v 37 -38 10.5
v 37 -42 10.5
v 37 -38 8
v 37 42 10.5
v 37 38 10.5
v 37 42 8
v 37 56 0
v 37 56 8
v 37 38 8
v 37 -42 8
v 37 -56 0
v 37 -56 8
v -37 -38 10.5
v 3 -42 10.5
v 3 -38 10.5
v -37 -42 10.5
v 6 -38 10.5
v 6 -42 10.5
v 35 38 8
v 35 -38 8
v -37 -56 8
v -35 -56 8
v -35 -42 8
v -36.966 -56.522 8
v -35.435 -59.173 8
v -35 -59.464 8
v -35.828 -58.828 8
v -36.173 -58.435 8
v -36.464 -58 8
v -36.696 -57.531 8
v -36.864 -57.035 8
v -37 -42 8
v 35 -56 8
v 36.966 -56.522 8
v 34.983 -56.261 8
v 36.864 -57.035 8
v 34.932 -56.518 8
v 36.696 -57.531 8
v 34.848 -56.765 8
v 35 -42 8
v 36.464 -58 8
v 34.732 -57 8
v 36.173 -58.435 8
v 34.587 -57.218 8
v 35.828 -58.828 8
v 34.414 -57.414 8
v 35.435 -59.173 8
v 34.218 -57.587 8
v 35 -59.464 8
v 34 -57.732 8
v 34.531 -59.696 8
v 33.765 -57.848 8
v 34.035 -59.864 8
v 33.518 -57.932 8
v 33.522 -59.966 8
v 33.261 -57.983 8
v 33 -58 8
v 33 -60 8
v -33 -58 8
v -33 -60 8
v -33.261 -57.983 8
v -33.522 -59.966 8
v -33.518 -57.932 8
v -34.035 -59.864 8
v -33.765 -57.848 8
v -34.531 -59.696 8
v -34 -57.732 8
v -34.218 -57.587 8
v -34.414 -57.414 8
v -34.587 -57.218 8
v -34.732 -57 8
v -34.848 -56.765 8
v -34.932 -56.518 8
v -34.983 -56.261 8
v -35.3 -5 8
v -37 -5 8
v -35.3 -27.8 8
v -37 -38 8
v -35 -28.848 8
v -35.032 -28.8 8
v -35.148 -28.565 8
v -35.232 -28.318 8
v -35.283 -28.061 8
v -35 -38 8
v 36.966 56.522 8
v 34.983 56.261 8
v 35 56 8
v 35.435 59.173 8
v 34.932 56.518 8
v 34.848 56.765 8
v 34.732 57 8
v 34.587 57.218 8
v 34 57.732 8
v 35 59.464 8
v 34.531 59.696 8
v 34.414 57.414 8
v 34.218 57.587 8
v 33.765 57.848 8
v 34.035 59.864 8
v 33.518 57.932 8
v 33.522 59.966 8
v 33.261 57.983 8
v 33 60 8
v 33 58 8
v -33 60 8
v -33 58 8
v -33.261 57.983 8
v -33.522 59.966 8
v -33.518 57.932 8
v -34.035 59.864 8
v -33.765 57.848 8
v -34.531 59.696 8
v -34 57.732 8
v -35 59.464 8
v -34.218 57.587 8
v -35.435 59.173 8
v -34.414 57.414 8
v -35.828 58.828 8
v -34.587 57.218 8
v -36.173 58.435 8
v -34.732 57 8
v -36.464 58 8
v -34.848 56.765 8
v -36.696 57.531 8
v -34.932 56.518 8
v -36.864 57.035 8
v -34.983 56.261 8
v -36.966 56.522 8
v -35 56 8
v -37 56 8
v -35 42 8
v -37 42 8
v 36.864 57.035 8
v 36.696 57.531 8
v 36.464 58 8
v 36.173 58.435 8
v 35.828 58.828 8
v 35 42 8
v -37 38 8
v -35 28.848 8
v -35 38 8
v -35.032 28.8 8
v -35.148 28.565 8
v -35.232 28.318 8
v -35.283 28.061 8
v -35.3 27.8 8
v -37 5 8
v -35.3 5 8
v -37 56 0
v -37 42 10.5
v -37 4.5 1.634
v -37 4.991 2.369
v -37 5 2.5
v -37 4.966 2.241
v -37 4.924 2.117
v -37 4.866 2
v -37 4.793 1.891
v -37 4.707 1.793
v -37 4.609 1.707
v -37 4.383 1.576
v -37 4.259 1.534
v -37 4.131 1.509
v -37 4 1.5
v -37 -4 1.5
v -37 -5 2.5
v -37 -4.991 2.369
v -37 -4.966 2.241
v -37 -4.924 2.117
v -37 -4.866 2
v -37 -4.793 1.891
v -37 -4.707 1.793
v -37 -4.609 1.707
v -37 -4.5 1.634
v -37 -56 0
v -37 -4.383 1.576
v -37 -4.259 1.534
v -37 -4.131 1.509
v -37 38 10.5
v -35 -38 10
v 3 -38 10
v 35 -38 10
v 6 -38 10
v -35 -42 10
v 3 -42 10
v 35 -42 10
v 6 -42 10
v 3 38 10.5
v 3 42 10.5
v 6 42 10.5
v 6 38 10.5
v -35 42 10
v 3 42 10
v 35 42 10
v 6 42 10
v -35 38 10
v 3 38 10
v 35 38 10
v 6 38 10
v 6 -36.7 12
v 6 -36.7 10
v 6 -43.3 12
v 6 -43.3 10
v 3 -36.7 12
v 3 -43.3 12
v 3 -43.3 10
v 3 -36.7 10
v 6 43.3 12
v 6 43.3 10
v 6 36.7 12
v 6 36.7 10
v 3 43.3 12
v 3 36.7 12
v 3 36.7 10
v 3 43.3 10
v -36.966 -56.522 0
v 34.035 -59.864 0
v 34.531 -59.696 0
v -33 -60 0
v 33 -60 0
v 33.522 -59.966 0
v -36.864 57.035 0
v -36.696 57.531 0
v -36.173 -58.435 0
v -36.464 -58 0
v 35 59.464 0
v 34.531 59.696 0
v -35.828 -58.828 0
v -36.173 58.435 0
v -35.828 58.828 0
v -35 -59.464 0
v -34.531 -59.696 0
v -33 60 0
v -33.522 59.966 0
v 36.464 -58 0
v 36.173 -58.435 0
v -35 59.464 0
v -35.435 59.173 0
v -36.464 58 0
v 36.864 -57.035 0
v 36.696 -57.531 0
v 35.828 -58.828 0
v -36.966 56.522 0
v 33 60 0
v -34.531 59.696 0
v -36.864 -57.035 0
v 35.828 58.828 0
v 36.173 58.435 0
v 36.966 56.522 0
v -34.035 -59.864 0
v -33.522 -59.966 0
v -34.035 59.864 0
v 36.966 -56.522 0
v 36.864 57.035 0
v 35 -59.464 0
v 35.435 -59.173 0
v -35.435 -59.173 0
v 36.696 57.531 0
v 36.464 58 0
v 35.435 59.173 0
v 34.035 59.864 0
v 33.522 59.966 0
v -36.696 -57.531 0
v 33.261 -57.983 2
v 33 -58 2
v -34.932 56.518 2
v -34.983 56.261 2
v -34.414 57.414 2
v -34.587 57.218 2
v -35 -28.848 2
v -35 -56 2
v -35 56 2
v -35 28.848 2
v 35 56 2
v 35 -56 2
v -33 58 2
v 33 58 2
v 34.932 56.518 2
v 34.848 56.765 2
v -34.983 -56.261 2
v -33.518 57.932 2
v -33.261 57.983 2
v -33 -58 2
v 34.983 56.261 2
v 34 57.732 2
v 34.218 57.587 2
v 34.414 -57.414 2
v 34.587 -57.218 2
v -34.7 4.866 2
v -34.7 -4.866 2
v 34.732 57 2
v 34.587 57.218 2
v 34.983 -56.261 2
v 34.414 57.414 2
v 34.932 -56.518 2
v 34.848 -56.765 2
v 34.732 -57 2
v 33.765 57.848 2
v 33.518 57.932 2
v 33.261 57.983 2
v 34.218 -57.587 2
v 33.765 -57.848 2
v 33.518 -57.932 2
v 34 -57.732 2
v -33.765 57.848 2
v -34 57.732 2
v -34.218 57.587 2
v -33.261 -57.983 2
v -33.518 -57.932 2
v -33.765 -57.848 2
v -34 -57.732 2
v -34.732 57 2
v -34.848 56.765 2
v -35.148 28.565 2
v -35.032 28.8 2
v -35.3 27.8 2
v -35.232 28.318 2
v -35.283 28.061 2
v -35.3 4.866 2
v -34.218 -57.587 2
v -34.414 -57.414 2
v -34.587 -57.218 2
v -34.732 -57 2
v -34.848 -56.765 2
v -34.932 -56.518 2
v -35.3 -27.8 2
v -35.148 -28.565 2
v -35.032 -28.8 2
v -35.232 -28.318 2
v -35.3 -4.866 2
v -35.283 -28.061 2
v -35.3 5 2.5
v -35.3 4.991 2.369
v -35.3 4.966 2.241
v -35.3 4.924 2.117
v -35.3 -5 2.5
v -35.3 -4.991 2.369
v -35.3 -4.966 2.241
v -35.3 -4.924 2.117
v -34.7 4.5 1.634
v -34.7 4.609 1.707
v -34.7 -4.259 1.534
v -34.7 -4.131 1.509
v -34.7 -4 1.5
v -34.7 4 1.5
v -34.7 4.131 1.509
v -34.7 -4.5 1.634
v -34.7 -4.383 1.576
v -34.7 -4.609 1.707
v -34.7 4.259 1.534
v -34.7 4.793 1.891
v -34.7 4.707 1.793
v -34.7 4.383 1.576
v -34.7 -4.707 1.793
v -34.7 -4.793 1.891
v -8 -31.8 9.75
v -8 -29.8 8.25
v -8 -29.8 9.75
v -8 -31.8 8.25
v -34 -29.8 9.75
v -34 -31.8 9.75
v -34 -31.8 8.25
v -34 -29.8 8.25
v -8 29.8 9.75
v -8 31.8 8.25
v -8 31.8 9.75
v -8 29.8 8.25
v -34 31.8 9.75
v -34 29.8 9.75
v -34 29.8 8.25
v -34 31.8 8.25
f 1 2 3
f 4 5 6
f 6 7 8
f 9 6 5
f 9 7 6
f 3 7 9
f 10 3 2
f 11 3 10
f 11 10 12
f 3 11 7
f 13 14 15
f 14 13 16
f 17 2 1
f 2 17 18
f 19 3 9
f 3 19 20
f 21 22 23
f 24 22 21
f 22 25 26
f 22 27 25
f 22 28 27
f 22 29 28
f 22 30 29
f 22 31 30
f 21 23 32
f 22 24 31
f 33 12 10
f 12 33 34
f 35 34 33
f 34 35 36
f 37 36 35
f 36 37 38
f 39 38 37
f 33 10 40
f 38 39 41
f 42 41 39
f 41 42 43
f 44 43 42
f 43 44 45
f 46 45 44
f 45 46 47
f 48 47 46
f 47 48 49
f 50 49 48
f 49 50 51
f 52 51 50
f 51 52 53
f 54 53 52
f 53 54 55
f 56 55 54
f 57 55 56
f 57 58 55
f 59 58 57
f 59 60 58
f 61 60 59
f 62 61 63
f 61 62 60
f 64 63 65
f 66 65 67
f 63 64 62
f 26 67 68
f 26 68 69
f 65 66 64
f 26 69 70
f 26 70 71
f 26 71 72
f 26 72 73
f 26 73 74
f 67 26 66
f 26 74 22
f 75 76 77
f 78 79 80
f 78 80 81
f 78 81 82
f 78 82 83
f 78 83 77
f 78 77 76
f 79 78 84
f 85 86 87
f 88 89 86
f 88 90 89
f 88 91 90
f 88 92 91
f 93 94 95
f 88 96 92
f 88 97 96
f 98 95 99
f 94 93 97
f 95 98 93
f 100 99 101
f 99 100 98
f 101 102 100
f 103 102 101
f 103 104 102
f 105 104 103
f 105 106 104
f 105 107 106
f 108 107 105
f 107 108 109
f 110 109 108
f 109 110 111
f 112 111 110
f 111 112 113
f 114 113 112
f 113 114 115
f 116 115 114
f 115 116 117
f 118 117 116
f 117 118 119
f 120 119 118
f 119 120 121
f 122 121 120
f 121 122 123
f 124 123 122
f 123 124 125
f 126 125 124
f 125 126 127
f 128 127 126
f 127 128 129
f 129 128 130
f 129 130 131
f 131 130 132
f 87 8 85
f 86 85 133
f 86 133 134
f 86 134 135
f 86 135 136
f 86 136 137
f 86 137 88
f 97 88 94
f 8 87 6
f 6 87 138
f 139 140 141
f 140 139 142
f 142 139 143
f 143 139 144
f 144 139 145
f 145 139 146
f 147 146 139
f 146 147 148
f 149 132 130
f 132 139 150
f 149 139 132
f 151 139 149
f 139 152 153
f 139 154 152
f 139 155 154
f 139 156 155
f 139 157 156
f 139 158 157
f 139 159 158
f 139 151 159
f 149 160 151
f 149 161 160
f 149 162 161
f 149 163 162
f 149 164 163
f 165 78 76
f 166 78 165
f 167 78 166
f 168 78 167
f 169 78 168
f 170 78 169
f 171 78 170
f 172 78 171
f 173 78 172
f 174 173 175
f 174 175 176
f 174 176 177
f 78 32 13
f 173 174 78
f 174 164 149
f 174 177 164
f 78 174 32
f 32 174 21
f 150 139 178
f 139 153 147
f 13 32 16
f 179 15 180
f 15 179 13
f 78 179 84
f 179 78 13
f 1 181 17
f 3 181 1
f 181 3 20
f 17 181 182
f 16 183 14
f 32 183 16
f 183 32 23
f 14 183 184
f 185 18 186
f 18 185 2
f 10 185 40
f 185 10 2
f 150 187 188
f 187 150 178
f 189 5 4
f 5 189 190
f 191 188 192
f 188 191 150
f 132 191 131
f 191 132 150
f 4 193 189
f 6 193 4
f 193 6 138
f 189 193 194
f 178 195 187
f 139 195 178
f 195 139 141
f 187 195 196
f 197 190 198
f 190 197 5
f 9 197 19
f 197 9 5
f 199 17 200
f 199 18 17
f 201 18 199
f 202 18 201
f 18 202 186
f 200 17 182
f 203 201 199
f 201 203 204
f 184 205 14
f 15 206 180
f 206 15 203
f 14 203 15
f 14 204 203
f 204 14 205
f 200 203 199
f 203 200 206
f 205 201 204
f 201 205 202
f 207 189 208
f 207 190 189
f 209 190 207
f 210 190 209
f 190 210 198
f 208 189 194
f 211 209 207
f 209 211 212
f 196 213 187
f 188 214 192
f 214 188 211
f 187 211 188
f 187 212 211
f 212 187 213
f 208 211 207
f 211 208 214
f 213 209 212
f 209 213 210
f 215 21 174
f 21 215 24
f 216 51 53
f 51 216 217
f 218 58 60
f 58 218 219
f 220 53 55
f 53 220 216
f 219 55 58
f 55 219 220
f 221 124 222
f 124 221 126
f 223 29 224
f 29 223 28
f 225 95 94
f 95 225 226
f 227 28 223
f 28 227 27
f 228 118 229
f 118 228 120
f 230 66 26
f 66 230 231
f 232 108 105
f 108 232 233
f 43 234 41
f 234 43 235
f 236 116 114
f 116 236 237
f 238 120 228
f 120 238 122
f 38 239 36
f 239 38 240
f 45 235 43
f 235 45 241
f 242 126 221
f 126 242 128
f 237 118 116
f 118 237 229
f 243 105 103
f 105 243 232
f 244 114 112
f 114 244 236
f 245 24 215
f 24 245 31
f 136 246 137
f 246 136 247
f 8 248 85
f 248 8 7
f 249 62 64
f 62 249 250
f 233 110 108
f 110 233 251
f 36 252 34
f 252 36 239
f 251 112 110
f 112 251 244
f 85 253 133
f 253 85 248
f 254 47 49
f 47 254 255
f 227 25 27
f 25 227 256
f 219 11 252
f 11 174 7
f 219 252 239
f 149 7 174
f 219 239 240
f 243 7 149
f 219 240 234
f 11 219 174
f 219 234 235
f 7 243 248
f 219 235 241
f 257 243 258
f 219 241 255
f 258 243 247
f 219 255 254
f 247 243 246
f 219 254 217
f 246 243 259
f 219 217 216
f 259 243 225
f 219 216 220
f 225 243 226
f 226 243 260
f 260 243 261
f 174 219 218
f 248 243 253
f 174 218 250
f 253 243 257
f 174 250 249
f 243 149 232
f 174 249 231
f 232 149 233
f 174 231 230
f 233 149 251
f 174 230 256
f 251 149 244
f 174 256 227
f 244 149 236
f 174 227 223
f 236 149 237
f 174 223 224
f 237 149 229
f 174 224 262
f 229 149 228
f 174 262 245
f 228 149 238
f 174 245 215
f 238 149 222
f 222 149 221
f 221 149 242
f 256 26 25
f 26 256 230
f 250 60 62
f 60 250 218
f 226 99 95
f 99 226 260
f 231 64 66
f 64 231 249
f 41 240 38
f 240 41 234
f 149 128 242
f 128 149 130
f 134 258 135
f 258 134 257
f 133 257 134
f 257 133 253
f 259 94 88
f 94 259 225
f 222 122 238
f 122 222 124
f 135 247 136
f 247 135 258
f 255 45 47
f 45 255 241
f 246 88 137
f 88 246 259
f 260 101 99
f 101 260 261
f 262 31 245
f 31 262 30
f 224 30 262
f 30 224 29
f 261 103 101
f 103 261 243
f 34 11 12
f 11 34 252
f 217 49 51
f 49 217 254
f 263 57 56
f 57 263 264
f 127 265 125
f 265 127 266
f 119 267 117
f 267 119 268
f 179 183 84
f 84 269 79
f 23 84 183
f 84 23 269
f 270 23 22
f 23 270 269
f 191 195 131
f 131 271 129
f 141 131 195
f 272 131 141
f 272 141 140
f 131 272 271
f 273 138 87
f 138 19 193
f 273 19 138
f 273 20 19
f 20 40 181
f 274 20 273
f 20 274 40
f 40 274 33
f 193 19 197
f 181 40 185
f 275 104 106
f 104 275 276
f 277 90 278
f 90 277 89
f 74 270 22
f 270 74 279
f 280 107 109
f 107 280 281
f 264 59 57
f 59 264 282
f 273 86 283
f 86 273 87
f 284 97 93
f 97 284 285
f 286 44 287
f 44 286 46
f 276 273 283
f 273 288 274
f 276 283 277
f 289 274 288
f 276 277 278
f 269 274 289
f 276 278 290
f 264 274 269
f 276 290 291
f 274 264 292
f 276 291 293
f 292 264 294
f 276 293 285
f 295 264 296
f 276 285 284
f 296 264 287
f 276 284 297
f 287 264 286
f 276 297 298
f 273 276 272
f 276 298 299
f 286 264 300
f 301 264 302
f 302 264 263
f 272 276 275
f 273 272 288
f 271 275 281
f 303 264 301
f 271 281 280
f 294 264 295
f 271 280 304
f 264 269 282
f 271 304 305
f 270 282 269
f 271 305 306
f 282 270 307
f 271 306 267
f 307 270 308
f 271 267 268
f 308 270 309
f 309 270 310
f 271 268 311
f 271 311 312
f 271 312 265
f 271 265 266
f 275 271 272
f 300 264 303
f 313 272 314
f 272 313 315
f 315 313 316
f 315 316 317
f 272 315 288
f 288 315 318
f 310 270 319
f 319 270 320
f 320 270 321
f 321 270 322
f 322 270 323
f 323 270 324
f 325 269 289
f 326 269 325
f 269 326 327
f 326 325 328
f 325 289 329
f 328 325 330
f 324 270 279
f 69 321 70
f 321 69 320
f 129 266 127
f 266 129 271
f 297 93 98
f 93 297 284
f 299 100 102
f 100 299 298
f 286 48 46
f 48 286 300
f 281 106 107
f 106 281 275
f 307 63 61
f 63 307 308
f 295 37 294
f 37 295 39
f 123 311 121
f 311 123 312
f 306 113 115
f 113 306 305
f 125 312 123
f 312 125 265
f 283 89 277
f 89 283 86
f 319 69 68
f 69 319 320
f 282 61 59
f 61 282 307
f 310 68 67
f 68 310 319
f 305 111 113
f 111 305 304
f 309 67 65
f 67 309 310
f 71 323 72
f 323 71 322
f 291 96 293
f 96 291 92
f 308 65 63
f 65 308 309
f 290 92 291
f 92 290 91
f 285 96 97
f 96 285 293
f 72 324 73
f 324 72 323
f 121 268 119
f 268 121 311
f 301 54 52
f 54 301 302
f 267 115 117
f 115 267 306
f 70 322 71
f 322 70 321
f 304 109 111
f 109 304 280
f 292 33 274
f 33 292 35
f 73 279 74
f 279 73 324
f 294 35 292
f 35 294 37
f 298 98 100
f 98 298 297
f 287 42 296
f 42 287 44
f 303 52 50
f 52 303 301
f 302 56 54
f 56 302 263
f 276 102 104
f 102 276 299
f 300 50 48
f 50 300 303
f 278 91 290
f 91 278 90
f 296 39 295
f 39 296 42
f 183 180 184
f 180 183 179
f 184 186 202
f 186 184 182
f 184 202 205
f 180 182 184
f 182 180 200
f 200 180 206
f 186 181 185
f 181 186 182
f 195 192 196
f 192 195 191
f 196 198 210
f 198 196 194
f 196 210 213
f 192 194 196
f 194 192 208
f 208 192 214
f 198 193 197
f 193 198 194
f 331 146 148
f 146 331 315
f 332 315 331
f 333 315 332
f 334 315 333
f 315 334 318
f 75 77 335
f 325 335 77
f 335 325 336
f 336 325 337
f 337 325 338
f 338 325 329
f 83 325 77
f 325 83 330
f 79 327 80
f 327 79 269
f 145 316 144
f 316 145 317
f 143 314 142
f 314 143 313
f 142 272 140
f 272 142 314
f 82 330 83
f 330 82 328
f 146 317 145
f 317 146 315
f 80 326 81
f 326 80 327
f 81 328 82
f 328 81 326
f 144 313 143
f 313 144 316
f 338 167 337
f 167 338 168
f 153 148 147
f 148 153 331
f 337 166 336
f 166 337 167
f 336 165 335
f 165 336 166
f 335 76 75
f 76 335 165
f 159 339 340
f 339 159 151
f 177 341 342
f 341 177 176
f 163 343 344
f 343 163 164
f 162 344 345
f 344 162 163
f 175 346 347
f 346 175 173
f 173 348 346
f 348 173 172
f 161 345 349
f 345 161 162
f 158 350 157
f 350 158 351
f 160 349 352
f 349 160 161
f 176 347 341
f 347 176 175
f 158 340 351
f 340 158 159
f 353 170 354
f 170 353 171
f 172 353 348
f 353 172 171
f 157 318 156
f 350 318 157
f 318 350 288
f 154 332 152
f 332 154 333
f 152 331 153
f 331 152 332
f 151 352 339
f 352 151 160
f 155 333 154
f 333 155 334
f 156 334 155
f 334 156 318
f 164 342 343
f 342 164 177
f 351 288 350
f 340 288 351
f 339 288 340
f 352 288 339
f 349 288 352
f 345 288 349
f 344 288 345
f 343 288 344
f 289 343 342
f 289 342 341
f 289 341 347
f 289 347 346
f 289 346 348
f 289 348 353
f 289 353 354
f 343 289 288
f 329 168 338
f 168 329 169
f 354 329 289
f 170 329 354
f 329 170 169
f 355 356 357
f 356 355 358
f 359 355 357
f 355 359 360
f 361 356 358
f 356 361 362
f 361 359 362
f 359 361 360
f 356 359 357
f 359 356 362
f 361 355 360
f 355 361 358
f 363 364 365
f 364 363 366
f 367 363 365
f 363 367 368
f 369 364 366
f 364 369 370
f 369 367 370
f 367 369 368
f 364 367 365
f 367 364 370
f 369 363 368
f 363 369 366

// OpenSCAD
// file: utilities.scad
// ============================================================================
// Meshtastic Sliding Phone – Utility Modules
// ============================================================================
// Reusable shapes and helpers shared by all phone components.
// ============================================================================

include <parameters.scad>

// --- 2-D rounded rectangle (profile for linear_extrude) ---
module rounded_rect(w, h, r) {
    offset(r = r)
        square([w - 2*r, h - 2*r], center = true);
}

// --- 3-D rounded box ---
module rounded_box(w, h, d, r) {
    linear_extrude(height = d)
        rounded_rect(w, h, r);
}

// --- Hollow rounded shell ---
module rounded_shell(w, h, d, r, t) {
    difference() {
        rounded_box(w, h, d, r);
        translate([0, 0, t])
            rounded_box(w - 2*t, h - 2*t, d, max(r - t, 0.5));
    }
}

// --- Screw post (solid cylinder with through hole) ---
module screw_post(h, od, id) {
    difference() {
        cylinder(h = h, d = od);
        translate([0, 0, -0.1])
            cylinder(h = h + 0.2, d = id);
    }
}

// --- Speaker / vent grille pattern ---
module grille_pattern(cols, rows, slot_w, slot_h, spacing, slot_r) {
    total_w = cols * (slot_w + spacing) - spacing;
    total_h = rows * (slot_h + spacing) - spacing;
    translate([-total_w/2, -total_h/2, 0])
        for (c = [0 : cols-1])
            for (r = [0 : rows-1])
                translate([c * (slot_w + spacing) + slot_w/2,
                           r * (slot_h + spacing) + slot_h/2, 0])
                    rounded_rect(slot_w, slot_h, slot_r);
}

// ============================================================================
// Shortways (X-axis) slider – rail modules
// ============================================================================
// The keyboard tray has two parallel rectangular runners on its top face.
// These runners slide inside matching channels in the bottom-shell underside,
// constraining front/back (Y-axis) drift and keeping the slide straight.
// Rails run along the X axis (the 74 mm short side) and are positioned at
// Y = ±rail_y from the phone centreline (near the top and bottom long edges).
//
// The channel is intentionally 1 mm deeper than the runner is tall, creating
// a 1 mm air-gap standoff between the tray top face and the shell underside.
// This standoff reduces friction during sliding and sets a predictable gap
// for the neodymium magnet detents.
// ============================================================================

// A single rectangular runner – placed on the tray top face, protruding up.
//   length = X-axis extent of the runner
module rail_runner(length) {
    cube([length, rail_w, rail_h]);
}

// The void to subtract from the bot-shell underside to form one rail channel.
//   length = X-axis extent (pass phone_width; +2 extra mm for open ends)
module rail_channel_void(length) {
    cube([length + 2, rail_channel_w, rail_channel_h]);
}

// ============================================================================
// Magnet-pocket module
// ============================================================================
// Cylindrical press-fit pocket for one neodymium disc magnet (5 mm × 2 mm).
// The pocket is 0.5 mm deeper than the magnet so the magnet sits 0.5 mm
// below the face — this recess, combined with the 1 mm rail standoff, gives
// a guaranteed 2 mm air gap between opposing magnet faces:
//
//   gap = rail_standoff + 2 × pocket_recess = 1.0 + 0.5 + 0.5 = 2.0 mm
//
// The extra 0.1 mm on the cylinder height ensures a clean boolean cut.
// ============================================================================
module magnet_pocket() {
    cylinder(h = magnet_pocket_h + 0.1, d = magnet_pocket_d);
}
// file: parameters.scad
// ============================================================================
// Meshtastic Sliding Phone – Shared Parameters
// ============================================================================
// All dimensions in millimeters.
//
// Form factor: landscape slider phone (Nokia N900-style).
//   Closed: 74 × 120 × 27 mm (X × Y × Z)   Open: ~116 × 120 × 27 mm
//
// Mechanism: the keyboard tray slides in the −X direction (shortways, along
// the 74 mm short axis) along two parallel rectangular top/bottom rails.
// Holding the phone in landscape (120 mm horizontal, 74 mm vertical), the
// keyboard slides downward to expose the CardKB — the same motion as the
// Nokia N900.  Small recessed neodymium disc magnets create snap detents at
// the closed and open positions and provide continuous Z-axis retention that
// keeps the tray against the phone body during sliding.
// ============================================================================

// --- Overall phone body footprint (closed) ---
phone_length    = 120;   // Y: body length (Nokia N900 = 110.9 mm for reference)
phone_width     =  74;   // X: body width  (accommodates 59 mm CardKB + rails)

// --- Shell / tray heights ---
top_shell_z     =  10;   // Top shell    – display face, Heltec PCB
bot_shell_z     =   9;   // Bottom shell – LiPo battery, USB-C, SMA, rail channels
tray_z          =   8;   // Keyboard tray – CardKB pocket, rail runners, magnets

// Total closed thickness (informational)
phone_thickness = top_shell_z + bot_shell_z + tray_z;   // 27 mm

// --- Wall thickness and tolerances ---
wall            = 2.0;   // General wall / shell thickness
clearance       = 0.3;   // Sliding-fit clearance per side
corner_radius   = 4.0;   // Rounded corner radius

// --- Display viewport (Heltec V4 built-in 0.96″ OLED, 128×64) ---
// Cutout is sized with a small margin to accept an optional capacitive
// touch-overlay panel on top of the OLED glass (the V4 exposes 7 touch pins).
display_w        = 23;   // Viewable width  (21 mm OLED + 2 mm touch-overlay margin)
display_h        = 13;   // Viewable height (11 mm OLED + 2 mm touch-overlay margin)
display_offset_y = 12;   // Distance from top edge of top shell to viewport centre
display_depth    =  2.0; // Countersink depth (protects display / touch glass)

// --- Heltec WiFi LoRa 32 V4 board (ESP32-S3 + SX1262 + 0.96″ OLED) ---
// Actual PCB dimensions: 51.7 × 25.4 × 10.7 mm (with display casing).
pcb_length      = 52;    // Board Y length (rounded from 51.7 mm)
pcb_width       = 26;    // Board X width  (rounded from 25.4 mm)
pcb_thickness   =  1.6;  // PCB thickness
pcb_clearance   =  9;    // Component height above PCB (OLED casing, antenna, etc.)

// --- LiPo battery (slim 3.7 V pouch, ~50×40×5 mm nominal) ---
lipo_thickness  =  6;    // 5 mm nominal + 1 mm tolerance
lipo_width      = 42;    // 40 mm + 2 mm tolerance
lipo_length     = 52;    // 50 mm + 2 mm tolerance

// --- CardKB keyboard module (M5Stack CardKB, I²C) ---
cardkb_length    = 59;   // Long axis – runs along phone Y-axis when installed
cardkb_width     = 28;   // Short axis – along sliding X-axis (sets min travel)
cardkb_thickness =  7;   // Height (Z)

// --- Keyboard slide travel ---
keyboard_travel  = 42;   // mm; fully exposes CardKB (≥ cardkb_width + 14 mm margin)

// ============================================================================
// Parallel top/bottom-rail system
// ============================================================================
// Two rectangular-section runners on the keyboard-tray top face protrude
// upward into matching channels cut into the bottom-shell underside.
// The runners run along the X axis (the 74 mm SHORT side of the phone),
// positioned at Y = ±rail_y from the phone centreline (top and bottom edges).
// The runner width (Y) constrains front/back drift; the channel depth is
// intentionally greater than the runner height so the runners do NOT touch
// the channel ceiling – this creates a 1 mm air gap (standoff) between the
// tray top face and the shell underside, giving low-friction sliding.
//
//   Standoff = rail_channel_h − rail_h = 3.5 − 2.5 = 1.0 mm
// ============================================================================
rail_w          =  4.0;  // Runner width  (Y direction)
rail_h          =  2.5;  // Runner height (Z, protrudes above tray top face)
rail_y          = 40.0;  // ±Y distance from phone centreline to runner centre

// Channel in bot-shell underside (slightly wider + intentionally deeper)
rail_channel_w  = rail_w + 2 * clearance;   // 4.6 mm  – snug sliding fit
rail_channel_h  = rail_h + 1.0;             // 3.5 mm  – 1 mm standoff

// ============================================================================
// Neodymium disc-magnet detents
// ============================================================================
// Standard part: 5 mm dia × 2 mm thick, N42 grade.
// Each pocket is sized for a light press-fit (0.1 mm under-bore).
// Both opposing pockets are 0.5 mm deeper than the magnet so the magnet sits
// 0.5 mm below the face.  Guaranteed gap between opposing faces:
//
//   gap = standoff + 2 × recess = 1.0 + 0.5 + 0.5 = 2.0 mm  ✓
//
// Magnets must NEVER touch – the rail standoff makes this a hard guarantee.
// ============================================================================
magnet_d        =  5.0;  // Disc diameter
magnet_h        =  2.0;  // Disc thickness
magnet_pocket_d =  5.2;  // Pocket bore  (light press-fit)
magnet_pocket_h =  2.5;  // Pocket depth = magnet_h + 0.5 mm recess

// Magnet Y positions (centred between the two rails at ±rail_y = ±40 mm)
magnet_y        = 20.0;  // ±Y from phone centreline

// Detent X positions in the PHONE-BODY frame (bot-shell local coordinates):
//   Closed snap : body_X = +detent_x_offset
//   Open   snap : body_X = +detent_x_offset − keyboard_travel  (= +28 − 42 = −14 mm)
//
// The keyboard-tray magnets sit at tray-local X = +detent_x_offset.
// • When travel = 0  (closed): tray magnets align with body closed-snap pockets. ✓
// • When travel = 42 (open):   tray magnets align with body open-snap pockets.  ✓
detent_x_offset = 28.0;  // mm from body centre toward +X (right edge)

// --- Antenna (SMA connector) ---
sma_diameter    =  6.5;
sma_flat_width  =  8.0;

// --- USB-C port ---
usbc_width      =  9.5;
usbc_height     =  3.5;

// --- Speaker / microphone ---
speaker_diameter = 12;
mic_diameter     =  2;

// --- Screw posts (M2) ---
screw_hole_d    =  2.2;
screw_post_d    =  5.0;
screw_post_h    =  5.0;

// --- Legacy aliases (used by battery_cover / antenna_mount) ---
bot_shell_length = phone_length;
bot_shell_width  = phone_width;

// --- Quality ---
$fn = 48;  // Facet count for circles (increase for final export)
// main file
// ============================================================================
// Meshtastic Sliding Phone – Keyboard Tray  (sliding component)
// ============================================================================
// The horizontally sliding keyboard carriage.  Sits beneath the phone body
// and slides in the −X direction (shortways, along the 74 mm short axis) by
// keyboard_travel (42 mm) to expose the M5Stack CardKB module.  Holding the
// phone in landscape (120 mm wide × 74 mm tall) the keyboard slides downward,
// exactly like a Nokia N900.
//
// KEY FEATURES
// ─────────────────────────────────────────────────────────────────────────
// Parallel top/bottom rails
//   Two rectangular runners protrude from the tray top face (+Z).  They
//   slide inside matching channels cut into the bottom-shell underside,
//   keeping the motion straight and preventing front/back (Y-axis) wobble.
//   Runners run along the X axis; positioned at Y = ±rail_y = ±40 mm.
//   Runner dimensions: rail_w × rail_h = 4.0 × 2.5 mm.
//   The channels are 1 mm deeper (rail_channel_h = 3.5 mm) so the runners
//   float freely in Z — friction is only on the narrow runner side-faces.
//
// Magnetic detents (neodymium disc magnets, 5 mm dia × 2 mm thick, N42)
//   Two recessed pockets on the tray top face, centred at ±magnet_y = ±20 mm,
//   at tray-local X = +detent_x_offset = +28 mm.
//   Magnets sit 0.5 mm below the tray surface (pocket depth = 2.5 mm).
//   Combined with the 1 mm rail standoff and the 0.5 mm recess in the
//   bottom shell, the guaranteed air gap between opposing faces is 2.0 mm —
//   magnets CAN NEVER touch.
//
//   Alignment logic (body frame: phone body centred at origin):
//     Closed (travel = 0 mm): tray magnets at abs X = 0 + 28 = +28 mm
//                             → aligns with body's CLOSED-snap pockets. ✓
//     Open   (travel = 42 mm): tray magnets at abs X = −42 + 28 = −14 mm
//                             → aligns with body's OPEN-snap pockets.  ✓
//
// End-stop tabs
//   A pair of small tabs on the runners prevent over-travel in the open
//   direction.  At full travel the tabs press against the phone body's −X
//   face, providing a clean mechanical stop.  Tab X-position in tray coords:
//     tray_X = −phone_width/2 + keyboard_travel − tab_stop_margin
//            = −37 + 42 − 2 = +3 mm
//
// CardKB pocket
//   Recessed pocket at the −X (extension) end of the tray sized for the
//   M5Stack CardKB (59 × 28 × 7 mm).  The long axis (59 mm) runs along Y;
//   the short axis (28 mm) runs along X (the slide direction).
//   Retention ledges on the long (Y-axis) sides prevent the module from
//   falling out during slide.
//
// ─────────────────────────────────────────────────────────────────────────
// Assembly
//   1. Insert the tray from the −X end of the phone body: align the two
//      runners with the two channels and slide inward until the magnetic
//      detent snaps closed.
//   2. Press-fit magnets into the pockets (check pole orientation: opposing
//      pairs must attract, not repel).  A drop of CA glue is optional.
//   3. Slide closed — the magnetic snap should be clearly perceptible.
//
// Print orientation : TOP FACE DOWN (runners print upward; no supports needed)
// Print settings    : 0.2 mm layer height, 30 % infill, brim recommended
// ============================================================================

include <parameters.scad>
use <utilities.scad>

module keyboard_tray() {
    tray_w = phone_width;   // Tray X span matches phone body width (74 mm)

    difference() {
        union() {
            // --- Main tray body ---
            rounded_box(phone_width, phone_length, tray_z, corner_radius);

            // --- Rail runners (protrude upward from tray top face at Z = tray_z) ---
            // Positioned at Y = ±rail_y, running the full tray width in X.
            for (side = [-1, 1]) {
                translate([-tray_w / 2,
                           side * rail_y - rail_w / 2,
                           tray_z])
                    rail_runner(tray_w);
            }

            // --- Open-position end-stop tabs ---
            // The tab is (rail_channel_w + tab_w_extra) wide in Y so it cannot
            // pass through the channel opening, acting as a hard mechanical stop.
            // The tab's leading (−X) face contacts the phone body −X wall when
            // travel = keyboard_travel − tab_stop_margin (40 mm), giving a
            // 2 mm safety margin so the tray decelerates before the hard stop.
            //   tab_w_extra  = 2 mm (1 mm protruding each Y side of channel)
            //   tab_depth    = 3 mm (adequate bearing / contact surface in X)
            //   tab_z_ext    = 1.5 mm (taller than runner to ensure engagement)
            //   tab_stop_margin = 2 mm (contact happens 2 mm before max travel)
            tab_w_extra      = 2;
            tab_depth        = 3;
            tab_z_ext        = 1.5;
            tab_stop_margin  = 2;
            tab_lead_x = -tray_w / 2 + keyboard_travel - tab_stop_margin;
            for (side = [-1, 1]) {
                translate([tab_lead_x,
                           side * rail_y - (rail_channel_w + tab_w_extra) / 2,
                           tray_z])
                    cube([tab_depth, rail_channel_w + tab_w_extra, rail_h + tab_z_ext]);
            }
        }

        // --- Interior cavity ---
        translate([0, 0, wall])
            rounded_box(phone_width - 2 * wall,
                        phone_length - 2 * wall,
                        tray_z,
                        max(corner_radius - wall, 0.5));

        // --- CardKB module pocket (at the −X extension end) ---
        // The CardKB long axis (59 mm) runs along Y; short axis (28 mm) along X.
        // Positioned so the module is hidden when closed and fully exposed
        // when the tray has been slid out by keyboard_travel (42 mm).
        translate([-tray_w / 2 + wall + cardkb_width / 2,
                   0,
                   wall])
            rounded_box(cardkb_width  + 2 * clearance,
                        cardkb_length + 2 * clearance,
                        cardkb_thickness + 1,
                        2);

        // --- I²C / ribbon-cable relief slot (front/−X edge of tray) ---
        translate([-tray_w / 2 - 0.1,
                   0,
                   wall + cardkb_thickness / 2])
            rotate([0, 90, 0])
                rounded_box(cardkb_thickness + 1, 10, wall + 0.4, 1);

        // --- Magnet pockets on tray top face (openings at Z = tray_z) ---
        // Pockets are centred at ±magnet_y, X = +detent_x_offset (+28 mm).
        // translate Z = tray_z − magnet_pocket_h puts the pocket opening
        // flush with the tray top face; the +0.1 in magnet_pocket() ensures
        // the boolean cut breaks through the face cleanly.
        for (side = [-1, 1]) {
            translate([detent_x_offset,
                       side * magnet_y,
                       tray_z - magnet_pocket_h])
                magnet_pocket();
        }
    }

    // --- CardKB retention ledges (snap lips to hold module in pocket) ---
    // Ledges on the +Y and −Y sides of the pocket (short ends of the CardKB).
    for (side = [-1, 1]) {
        translate([-tray_w / 2 + wall + cardkb_width / 2,
                   side * (cardkb_length / 2 + clearance + 1),
                   wall + cardkb_thickness])
            cube([cardkb_width - 2, 2, 1.5], center = true);
    }
}

// --- Render ---
keyboard_tray();
